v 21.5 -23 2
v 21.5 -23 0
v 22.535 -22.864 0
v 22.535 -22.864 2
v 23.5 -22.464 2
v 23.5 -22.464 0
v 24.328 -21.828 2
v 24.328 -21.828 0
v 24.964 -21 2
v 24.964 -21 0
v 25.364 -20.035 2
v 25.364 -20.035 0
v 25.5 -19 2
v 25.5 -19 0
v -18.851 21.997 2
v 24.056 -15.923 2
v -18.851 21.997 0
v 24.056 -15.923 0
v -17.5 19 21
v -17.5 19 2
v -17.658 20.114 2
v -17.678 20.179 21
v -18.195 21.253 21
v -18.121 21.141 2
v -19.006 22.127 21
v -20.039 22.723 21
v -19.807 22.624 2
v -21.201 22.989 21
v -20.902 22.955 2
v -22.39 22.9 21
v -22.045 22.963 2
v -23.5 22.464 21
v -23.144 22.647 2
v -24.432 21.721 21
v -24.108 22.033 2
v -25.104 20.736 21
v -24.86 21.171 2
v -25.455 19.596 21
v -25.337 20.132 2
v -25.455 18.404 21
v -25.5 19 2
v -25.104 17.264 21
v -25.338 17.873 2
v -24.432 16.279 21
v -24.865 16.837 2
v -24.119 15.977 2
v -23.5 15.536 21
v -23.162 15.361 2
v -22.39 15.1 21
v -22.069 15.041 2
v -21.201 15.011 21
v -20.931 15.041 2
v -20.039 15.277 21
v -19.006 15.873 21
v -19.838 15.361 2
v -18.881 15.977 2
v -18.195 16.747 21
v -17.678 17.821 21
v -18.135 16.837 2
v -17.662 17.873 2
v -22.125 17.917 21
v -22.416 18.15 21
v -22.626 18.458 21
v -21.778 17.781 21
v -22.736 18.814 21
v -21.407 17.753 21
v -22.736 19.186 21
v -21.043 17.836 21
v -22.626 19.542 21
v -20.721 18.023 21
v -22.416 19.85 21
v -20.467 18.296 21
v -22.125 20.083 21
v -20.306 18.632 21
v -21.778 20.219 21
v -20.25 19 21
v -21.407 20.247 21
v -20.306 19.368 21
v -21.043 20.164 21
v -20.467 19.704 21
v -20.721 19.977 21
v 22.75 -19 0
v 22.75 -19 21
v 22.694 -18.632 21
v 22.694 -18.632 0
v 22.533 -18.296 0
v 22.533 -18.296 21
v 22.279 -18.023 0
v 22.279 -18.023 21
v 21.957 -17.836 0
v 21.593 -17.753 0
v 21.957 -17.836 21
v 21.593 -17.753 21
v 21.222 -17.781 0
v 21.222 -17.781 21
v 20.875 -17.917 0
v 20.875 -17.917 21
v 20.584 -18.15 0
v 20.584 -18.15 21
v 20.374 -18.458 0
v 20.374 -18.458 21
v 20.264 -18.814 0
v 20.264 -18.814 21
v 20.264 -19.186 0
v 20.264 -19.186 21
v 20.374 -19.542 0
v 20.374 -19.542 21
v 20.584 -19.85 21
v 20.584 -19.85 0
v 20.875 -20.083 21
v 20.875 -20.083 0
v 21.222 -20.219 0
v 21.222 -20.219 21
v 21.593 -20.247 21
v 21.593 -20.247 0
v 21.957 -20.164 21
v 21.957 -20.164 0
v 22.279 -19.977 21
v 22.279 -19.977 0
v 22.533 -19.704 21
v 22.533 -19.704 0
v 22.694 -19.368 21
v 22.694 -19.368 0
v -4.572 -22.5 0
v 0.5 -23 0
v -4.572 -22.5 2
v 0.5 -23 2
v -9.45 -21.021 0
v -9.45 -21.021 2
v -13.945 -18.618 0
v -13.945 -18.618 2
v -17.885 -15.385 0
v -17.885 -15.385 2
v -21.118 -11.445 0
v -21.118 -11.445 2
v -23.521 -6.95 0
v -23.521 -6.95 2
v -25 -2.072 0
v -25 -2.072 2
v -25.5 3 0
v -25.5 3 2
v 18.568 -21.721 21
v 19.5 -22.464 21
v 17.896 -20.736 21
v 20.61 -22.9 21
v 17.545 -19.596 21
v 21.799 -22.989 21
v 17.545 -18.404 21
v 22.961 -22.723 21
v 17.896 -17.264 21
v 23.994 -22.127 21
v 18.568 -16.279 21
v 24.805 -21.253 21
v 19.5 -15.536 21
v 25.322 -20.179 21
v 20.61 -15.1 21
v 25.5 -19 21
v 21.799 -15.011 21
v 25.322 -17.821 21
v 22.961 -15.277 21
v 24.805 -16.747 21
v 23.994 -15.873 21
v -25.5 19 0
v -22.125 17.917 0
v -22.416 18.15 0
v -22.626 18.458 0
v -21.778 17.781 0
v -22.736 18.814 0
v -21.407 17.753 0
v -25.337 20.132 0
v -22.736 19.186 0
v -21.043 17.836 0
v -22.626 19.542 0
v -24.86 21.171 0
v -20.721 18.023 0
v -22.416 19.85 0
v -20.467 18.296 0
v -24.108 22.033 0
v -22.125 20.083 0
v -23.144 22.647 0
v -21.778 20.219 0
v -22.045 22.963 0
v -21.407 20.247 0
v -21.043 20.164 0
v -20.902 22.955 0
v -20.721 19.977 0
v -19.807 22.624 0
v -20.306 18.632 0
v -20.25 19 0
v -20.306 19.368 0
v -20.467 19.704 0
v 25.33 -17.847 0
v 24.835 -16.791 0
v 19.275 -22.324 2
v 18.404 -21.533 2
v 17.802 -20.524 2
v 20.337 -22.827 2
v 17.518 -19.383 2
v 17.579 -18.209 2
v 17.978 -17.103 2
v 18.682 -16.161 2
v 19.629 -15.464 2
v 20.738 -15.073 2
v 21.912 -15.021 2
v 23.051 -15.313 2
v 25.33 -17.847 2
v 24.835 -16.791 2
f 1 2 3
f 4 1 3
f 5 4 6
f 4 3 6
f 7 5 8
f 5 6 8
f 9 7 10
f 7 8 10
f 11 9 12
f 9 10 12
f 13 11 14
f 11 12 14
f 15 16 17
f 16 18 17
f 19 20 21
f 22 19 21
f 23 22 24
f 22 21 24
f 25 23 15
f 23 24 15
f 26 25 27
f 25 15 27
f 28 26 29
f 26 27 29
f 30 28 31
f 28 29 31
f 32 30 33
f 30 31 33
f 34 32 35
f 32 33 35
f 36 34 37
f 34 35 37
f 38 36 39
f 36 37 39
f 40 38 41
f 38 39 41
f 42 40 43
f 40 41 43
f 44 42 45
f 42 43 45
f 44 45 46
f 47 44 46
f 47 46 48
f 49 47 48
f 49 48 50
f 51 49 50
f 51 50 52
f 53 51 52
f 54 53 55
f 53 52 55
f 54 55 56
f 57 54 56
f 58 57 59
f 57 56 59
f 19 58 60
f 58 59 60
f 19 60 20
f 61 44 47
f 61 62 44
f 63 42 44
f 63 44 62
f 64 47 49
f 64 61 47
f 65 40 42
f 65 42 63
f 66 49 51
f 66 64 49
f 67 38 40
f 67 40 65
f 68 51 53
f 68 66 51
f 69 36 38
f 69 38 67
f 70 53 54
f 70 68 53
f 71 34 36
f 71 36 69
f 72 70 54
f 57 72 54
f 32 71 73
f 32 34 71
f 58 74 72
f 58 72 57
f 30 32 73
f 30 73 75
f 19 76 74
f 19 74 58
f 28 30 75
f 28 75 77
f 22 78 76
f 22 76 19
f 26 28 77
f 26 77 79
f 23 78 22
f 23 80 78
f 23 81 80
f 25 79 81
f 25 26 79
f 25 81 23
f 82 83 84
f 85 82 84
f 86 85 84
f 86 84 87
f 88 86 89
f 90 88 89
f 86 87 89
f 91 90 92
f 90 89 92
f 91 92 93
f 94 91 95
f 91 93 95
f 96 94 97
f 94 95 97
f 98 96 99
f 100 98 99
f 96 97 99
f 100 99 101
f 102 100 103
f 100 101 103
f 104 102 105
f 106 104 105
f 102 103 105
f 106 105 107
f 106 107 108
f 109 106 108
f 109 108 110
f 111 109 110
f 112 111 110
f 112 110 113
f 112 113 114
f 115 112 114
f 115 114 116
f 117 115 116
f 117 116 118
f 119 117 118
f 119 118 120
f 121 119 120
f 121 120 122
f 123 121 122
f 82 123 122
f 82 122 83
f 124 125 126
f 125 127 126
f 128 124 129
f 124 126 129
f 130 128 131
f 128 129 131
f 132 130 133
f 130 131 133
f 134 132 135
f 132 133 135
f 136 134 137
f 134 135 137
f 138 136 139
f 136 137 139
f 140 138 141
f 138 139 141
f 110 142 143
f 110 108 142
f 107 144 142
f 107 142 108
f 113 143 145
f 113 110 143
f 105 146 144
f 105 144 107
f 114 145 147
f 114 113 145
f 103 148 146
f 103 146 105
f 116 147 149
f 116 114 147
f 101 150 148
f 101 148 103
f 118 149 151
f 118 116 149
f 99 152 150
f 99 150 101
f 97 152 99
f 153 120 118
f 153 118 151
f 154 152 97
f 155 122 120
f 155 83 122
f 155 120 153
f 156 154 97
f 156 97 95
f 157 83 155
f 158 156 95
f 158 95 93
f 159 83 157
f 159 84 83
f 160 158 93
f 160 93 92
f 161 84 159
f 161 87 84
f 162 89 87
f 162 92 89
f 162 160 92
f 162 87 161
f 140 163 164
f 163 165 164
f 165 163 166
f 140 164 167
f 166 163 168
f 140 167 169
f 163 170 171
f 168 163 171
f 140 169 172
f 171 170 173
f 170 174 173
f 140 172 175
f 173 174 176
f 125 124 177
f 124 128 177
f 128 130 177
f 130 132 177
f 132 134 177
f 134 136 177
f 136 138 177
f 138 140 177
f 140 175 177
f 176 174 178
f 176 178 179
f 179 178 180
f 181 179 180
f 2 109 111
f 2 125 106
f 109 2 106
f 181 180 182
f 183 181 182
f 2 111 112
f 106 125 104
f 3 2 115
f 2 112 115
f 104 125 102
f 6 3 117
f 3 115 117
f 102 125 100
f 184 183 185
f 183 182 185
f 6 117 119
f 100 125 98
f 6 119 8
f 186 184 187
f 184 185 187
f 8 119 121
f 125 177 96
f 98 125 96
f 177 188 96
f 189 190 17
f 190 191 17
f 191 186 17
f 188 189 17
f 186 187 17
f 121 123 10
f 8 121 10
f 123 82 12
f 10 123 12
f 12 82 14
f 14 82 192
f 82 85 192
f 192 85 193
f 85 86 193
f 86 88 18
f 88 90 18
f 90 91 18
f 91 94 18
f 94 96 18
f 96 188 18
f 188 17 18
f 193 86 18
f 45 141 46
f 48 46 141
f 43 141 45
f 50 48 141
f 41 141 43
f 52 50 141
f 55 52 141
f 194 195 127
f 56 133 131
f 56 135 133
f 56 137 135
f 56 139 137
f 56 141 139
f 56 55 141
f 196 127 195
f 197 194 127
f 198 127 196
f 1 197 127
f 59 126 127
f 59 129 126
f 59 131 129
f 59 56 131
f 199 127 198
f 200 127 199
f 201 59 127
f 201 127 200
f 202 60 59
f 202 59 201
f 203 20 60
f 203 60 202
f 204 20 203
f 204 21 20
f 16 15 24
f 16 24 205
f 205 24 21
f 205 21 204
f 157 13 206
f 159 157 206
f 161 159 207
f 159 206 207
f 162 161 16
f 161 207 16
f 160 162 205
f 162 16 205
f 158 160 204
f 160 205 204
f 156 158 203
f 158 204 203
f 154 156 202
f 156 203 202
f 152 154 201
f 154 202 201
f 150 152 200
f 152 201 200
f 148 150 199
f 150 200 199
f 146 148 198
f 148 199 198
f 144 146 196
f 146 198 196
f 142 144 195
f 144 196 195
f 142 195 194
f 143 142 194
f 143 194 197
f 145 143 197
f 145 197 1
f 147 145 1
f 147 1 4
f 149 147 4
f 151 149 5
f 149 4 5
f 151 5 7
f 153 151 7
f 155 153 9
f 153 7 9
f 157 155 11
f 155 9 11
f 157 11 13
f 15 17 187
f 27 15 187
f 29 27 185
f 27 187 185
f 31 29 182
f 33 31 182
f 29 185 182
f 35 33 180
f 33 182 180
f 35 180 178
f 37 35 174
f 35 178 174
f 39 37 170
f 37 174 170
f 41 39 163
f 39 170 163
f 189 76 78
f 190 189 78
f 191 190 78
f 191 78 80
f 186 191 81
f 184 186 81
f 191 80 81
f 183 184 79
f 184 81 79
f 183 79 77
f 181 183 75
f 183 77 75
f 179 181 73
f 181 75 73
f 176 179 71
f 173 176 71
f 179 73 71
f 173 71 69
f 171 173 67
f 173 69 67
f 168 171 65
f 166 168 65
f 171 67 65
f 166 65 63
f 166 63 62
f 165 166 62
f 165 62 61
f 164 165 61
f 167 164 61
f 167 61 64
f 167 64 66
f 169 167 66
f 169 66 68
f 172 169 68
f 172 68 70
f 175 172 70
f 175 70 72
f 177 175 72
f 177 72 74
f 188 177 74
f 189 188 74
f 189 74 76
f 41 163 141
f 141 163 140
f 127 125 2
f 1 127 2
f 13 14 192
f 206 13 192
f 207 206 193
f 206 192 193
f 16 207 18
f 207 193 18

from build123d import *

# Parameters (mm, degrees)
F1_DEPTH = 2
F2_R     = 4
F3_DEPTH = 19
F4_R     = 1.25
F5_DEPTH = 21.001
F6_R     = 1.25
F7_DEPTH = 21.001
F8_R     = 26


with BuildPart() as f1:
    # F0 (on Top) → F1 (new body)
    with BuildSketch(Plane.XY):
        with BuildLine():
            ThreePointArc((-17.5, 19), (-21.5, 15), (-25.5, 19))
            Line((-25.5, 19), (-25.5, -23))
            Line((-25.5, -23), (21.5, -23))
            ThreePointArc((21.5, -23), (17.737893, -17.641123), (24.056121, -15.923274))
            Line((24.056121, -15.923274), (-18.851111, 21.99723))
            ThreePointArc((-18.851111, 21.99723), (-17.853388, 20.643844), (-17.5, 19))
        make_face()
        with BuildLine():
            ThreePointArc((-18.851111, 21.99723), (-23.143844, 22.646612), (-25.5, 19))
            ThreePointArc((-25.5, 19), (-21.5, 15), (-17.5, 19))
            ThreePointArc((-17.5, 19), (-17.853388, 20.643844), (-18.851111, 21.99723))
        make_face()
        with BuildLine():
            ThreePointArc((24.056121, -15.923274), (17.737893, -17.641123), (21.5, -23))
            ThreePointArc((21.5, -23), (24.328427, -21.828427), (25.5, -19))
            ThreePointArc((25.5, -19), (25.121083, -17.30066), (24.056121, -15.923274))
        make_face()
    extrude(amount=F1_DEPTH)

    # F2 (on face) → F3 (join)
    with BuildSketch(Plane.XY.offset(2)):
        with Locations((-21.5, 19)):
            Circle(F2_R)
        with Locations((21.5, -19)):
            Circle(F2_R)
    extrude(amount=F3_DEPTH)

    # F4 (on face) → F5 (cut, through all)
    with BuildSketch(Plane.XY.offset(21)):
        with Locations((-21.5, 19)):
            Circle(F4_R)
    extrude(amount=-F5_DEPTH, mode=Mode.SUBTRACT)

    # F6 (on face) → F7 (cut, through all)
    with BuildSketch(Plane.XY.offset(21)):
        with Locations((21.5, -19)):
            Circle(F6_R)
    extrude(amount=-F7_DEPTH, mode=Mode.SUBTRACT)

    # F8
    f8_edges = [f1.edges().sort_by_distance(p)[0] for p in [
        (-25.5, -23, 1),
    ]]
    fillet(f8_edges, radius=F8_R)


solid = f1.part
